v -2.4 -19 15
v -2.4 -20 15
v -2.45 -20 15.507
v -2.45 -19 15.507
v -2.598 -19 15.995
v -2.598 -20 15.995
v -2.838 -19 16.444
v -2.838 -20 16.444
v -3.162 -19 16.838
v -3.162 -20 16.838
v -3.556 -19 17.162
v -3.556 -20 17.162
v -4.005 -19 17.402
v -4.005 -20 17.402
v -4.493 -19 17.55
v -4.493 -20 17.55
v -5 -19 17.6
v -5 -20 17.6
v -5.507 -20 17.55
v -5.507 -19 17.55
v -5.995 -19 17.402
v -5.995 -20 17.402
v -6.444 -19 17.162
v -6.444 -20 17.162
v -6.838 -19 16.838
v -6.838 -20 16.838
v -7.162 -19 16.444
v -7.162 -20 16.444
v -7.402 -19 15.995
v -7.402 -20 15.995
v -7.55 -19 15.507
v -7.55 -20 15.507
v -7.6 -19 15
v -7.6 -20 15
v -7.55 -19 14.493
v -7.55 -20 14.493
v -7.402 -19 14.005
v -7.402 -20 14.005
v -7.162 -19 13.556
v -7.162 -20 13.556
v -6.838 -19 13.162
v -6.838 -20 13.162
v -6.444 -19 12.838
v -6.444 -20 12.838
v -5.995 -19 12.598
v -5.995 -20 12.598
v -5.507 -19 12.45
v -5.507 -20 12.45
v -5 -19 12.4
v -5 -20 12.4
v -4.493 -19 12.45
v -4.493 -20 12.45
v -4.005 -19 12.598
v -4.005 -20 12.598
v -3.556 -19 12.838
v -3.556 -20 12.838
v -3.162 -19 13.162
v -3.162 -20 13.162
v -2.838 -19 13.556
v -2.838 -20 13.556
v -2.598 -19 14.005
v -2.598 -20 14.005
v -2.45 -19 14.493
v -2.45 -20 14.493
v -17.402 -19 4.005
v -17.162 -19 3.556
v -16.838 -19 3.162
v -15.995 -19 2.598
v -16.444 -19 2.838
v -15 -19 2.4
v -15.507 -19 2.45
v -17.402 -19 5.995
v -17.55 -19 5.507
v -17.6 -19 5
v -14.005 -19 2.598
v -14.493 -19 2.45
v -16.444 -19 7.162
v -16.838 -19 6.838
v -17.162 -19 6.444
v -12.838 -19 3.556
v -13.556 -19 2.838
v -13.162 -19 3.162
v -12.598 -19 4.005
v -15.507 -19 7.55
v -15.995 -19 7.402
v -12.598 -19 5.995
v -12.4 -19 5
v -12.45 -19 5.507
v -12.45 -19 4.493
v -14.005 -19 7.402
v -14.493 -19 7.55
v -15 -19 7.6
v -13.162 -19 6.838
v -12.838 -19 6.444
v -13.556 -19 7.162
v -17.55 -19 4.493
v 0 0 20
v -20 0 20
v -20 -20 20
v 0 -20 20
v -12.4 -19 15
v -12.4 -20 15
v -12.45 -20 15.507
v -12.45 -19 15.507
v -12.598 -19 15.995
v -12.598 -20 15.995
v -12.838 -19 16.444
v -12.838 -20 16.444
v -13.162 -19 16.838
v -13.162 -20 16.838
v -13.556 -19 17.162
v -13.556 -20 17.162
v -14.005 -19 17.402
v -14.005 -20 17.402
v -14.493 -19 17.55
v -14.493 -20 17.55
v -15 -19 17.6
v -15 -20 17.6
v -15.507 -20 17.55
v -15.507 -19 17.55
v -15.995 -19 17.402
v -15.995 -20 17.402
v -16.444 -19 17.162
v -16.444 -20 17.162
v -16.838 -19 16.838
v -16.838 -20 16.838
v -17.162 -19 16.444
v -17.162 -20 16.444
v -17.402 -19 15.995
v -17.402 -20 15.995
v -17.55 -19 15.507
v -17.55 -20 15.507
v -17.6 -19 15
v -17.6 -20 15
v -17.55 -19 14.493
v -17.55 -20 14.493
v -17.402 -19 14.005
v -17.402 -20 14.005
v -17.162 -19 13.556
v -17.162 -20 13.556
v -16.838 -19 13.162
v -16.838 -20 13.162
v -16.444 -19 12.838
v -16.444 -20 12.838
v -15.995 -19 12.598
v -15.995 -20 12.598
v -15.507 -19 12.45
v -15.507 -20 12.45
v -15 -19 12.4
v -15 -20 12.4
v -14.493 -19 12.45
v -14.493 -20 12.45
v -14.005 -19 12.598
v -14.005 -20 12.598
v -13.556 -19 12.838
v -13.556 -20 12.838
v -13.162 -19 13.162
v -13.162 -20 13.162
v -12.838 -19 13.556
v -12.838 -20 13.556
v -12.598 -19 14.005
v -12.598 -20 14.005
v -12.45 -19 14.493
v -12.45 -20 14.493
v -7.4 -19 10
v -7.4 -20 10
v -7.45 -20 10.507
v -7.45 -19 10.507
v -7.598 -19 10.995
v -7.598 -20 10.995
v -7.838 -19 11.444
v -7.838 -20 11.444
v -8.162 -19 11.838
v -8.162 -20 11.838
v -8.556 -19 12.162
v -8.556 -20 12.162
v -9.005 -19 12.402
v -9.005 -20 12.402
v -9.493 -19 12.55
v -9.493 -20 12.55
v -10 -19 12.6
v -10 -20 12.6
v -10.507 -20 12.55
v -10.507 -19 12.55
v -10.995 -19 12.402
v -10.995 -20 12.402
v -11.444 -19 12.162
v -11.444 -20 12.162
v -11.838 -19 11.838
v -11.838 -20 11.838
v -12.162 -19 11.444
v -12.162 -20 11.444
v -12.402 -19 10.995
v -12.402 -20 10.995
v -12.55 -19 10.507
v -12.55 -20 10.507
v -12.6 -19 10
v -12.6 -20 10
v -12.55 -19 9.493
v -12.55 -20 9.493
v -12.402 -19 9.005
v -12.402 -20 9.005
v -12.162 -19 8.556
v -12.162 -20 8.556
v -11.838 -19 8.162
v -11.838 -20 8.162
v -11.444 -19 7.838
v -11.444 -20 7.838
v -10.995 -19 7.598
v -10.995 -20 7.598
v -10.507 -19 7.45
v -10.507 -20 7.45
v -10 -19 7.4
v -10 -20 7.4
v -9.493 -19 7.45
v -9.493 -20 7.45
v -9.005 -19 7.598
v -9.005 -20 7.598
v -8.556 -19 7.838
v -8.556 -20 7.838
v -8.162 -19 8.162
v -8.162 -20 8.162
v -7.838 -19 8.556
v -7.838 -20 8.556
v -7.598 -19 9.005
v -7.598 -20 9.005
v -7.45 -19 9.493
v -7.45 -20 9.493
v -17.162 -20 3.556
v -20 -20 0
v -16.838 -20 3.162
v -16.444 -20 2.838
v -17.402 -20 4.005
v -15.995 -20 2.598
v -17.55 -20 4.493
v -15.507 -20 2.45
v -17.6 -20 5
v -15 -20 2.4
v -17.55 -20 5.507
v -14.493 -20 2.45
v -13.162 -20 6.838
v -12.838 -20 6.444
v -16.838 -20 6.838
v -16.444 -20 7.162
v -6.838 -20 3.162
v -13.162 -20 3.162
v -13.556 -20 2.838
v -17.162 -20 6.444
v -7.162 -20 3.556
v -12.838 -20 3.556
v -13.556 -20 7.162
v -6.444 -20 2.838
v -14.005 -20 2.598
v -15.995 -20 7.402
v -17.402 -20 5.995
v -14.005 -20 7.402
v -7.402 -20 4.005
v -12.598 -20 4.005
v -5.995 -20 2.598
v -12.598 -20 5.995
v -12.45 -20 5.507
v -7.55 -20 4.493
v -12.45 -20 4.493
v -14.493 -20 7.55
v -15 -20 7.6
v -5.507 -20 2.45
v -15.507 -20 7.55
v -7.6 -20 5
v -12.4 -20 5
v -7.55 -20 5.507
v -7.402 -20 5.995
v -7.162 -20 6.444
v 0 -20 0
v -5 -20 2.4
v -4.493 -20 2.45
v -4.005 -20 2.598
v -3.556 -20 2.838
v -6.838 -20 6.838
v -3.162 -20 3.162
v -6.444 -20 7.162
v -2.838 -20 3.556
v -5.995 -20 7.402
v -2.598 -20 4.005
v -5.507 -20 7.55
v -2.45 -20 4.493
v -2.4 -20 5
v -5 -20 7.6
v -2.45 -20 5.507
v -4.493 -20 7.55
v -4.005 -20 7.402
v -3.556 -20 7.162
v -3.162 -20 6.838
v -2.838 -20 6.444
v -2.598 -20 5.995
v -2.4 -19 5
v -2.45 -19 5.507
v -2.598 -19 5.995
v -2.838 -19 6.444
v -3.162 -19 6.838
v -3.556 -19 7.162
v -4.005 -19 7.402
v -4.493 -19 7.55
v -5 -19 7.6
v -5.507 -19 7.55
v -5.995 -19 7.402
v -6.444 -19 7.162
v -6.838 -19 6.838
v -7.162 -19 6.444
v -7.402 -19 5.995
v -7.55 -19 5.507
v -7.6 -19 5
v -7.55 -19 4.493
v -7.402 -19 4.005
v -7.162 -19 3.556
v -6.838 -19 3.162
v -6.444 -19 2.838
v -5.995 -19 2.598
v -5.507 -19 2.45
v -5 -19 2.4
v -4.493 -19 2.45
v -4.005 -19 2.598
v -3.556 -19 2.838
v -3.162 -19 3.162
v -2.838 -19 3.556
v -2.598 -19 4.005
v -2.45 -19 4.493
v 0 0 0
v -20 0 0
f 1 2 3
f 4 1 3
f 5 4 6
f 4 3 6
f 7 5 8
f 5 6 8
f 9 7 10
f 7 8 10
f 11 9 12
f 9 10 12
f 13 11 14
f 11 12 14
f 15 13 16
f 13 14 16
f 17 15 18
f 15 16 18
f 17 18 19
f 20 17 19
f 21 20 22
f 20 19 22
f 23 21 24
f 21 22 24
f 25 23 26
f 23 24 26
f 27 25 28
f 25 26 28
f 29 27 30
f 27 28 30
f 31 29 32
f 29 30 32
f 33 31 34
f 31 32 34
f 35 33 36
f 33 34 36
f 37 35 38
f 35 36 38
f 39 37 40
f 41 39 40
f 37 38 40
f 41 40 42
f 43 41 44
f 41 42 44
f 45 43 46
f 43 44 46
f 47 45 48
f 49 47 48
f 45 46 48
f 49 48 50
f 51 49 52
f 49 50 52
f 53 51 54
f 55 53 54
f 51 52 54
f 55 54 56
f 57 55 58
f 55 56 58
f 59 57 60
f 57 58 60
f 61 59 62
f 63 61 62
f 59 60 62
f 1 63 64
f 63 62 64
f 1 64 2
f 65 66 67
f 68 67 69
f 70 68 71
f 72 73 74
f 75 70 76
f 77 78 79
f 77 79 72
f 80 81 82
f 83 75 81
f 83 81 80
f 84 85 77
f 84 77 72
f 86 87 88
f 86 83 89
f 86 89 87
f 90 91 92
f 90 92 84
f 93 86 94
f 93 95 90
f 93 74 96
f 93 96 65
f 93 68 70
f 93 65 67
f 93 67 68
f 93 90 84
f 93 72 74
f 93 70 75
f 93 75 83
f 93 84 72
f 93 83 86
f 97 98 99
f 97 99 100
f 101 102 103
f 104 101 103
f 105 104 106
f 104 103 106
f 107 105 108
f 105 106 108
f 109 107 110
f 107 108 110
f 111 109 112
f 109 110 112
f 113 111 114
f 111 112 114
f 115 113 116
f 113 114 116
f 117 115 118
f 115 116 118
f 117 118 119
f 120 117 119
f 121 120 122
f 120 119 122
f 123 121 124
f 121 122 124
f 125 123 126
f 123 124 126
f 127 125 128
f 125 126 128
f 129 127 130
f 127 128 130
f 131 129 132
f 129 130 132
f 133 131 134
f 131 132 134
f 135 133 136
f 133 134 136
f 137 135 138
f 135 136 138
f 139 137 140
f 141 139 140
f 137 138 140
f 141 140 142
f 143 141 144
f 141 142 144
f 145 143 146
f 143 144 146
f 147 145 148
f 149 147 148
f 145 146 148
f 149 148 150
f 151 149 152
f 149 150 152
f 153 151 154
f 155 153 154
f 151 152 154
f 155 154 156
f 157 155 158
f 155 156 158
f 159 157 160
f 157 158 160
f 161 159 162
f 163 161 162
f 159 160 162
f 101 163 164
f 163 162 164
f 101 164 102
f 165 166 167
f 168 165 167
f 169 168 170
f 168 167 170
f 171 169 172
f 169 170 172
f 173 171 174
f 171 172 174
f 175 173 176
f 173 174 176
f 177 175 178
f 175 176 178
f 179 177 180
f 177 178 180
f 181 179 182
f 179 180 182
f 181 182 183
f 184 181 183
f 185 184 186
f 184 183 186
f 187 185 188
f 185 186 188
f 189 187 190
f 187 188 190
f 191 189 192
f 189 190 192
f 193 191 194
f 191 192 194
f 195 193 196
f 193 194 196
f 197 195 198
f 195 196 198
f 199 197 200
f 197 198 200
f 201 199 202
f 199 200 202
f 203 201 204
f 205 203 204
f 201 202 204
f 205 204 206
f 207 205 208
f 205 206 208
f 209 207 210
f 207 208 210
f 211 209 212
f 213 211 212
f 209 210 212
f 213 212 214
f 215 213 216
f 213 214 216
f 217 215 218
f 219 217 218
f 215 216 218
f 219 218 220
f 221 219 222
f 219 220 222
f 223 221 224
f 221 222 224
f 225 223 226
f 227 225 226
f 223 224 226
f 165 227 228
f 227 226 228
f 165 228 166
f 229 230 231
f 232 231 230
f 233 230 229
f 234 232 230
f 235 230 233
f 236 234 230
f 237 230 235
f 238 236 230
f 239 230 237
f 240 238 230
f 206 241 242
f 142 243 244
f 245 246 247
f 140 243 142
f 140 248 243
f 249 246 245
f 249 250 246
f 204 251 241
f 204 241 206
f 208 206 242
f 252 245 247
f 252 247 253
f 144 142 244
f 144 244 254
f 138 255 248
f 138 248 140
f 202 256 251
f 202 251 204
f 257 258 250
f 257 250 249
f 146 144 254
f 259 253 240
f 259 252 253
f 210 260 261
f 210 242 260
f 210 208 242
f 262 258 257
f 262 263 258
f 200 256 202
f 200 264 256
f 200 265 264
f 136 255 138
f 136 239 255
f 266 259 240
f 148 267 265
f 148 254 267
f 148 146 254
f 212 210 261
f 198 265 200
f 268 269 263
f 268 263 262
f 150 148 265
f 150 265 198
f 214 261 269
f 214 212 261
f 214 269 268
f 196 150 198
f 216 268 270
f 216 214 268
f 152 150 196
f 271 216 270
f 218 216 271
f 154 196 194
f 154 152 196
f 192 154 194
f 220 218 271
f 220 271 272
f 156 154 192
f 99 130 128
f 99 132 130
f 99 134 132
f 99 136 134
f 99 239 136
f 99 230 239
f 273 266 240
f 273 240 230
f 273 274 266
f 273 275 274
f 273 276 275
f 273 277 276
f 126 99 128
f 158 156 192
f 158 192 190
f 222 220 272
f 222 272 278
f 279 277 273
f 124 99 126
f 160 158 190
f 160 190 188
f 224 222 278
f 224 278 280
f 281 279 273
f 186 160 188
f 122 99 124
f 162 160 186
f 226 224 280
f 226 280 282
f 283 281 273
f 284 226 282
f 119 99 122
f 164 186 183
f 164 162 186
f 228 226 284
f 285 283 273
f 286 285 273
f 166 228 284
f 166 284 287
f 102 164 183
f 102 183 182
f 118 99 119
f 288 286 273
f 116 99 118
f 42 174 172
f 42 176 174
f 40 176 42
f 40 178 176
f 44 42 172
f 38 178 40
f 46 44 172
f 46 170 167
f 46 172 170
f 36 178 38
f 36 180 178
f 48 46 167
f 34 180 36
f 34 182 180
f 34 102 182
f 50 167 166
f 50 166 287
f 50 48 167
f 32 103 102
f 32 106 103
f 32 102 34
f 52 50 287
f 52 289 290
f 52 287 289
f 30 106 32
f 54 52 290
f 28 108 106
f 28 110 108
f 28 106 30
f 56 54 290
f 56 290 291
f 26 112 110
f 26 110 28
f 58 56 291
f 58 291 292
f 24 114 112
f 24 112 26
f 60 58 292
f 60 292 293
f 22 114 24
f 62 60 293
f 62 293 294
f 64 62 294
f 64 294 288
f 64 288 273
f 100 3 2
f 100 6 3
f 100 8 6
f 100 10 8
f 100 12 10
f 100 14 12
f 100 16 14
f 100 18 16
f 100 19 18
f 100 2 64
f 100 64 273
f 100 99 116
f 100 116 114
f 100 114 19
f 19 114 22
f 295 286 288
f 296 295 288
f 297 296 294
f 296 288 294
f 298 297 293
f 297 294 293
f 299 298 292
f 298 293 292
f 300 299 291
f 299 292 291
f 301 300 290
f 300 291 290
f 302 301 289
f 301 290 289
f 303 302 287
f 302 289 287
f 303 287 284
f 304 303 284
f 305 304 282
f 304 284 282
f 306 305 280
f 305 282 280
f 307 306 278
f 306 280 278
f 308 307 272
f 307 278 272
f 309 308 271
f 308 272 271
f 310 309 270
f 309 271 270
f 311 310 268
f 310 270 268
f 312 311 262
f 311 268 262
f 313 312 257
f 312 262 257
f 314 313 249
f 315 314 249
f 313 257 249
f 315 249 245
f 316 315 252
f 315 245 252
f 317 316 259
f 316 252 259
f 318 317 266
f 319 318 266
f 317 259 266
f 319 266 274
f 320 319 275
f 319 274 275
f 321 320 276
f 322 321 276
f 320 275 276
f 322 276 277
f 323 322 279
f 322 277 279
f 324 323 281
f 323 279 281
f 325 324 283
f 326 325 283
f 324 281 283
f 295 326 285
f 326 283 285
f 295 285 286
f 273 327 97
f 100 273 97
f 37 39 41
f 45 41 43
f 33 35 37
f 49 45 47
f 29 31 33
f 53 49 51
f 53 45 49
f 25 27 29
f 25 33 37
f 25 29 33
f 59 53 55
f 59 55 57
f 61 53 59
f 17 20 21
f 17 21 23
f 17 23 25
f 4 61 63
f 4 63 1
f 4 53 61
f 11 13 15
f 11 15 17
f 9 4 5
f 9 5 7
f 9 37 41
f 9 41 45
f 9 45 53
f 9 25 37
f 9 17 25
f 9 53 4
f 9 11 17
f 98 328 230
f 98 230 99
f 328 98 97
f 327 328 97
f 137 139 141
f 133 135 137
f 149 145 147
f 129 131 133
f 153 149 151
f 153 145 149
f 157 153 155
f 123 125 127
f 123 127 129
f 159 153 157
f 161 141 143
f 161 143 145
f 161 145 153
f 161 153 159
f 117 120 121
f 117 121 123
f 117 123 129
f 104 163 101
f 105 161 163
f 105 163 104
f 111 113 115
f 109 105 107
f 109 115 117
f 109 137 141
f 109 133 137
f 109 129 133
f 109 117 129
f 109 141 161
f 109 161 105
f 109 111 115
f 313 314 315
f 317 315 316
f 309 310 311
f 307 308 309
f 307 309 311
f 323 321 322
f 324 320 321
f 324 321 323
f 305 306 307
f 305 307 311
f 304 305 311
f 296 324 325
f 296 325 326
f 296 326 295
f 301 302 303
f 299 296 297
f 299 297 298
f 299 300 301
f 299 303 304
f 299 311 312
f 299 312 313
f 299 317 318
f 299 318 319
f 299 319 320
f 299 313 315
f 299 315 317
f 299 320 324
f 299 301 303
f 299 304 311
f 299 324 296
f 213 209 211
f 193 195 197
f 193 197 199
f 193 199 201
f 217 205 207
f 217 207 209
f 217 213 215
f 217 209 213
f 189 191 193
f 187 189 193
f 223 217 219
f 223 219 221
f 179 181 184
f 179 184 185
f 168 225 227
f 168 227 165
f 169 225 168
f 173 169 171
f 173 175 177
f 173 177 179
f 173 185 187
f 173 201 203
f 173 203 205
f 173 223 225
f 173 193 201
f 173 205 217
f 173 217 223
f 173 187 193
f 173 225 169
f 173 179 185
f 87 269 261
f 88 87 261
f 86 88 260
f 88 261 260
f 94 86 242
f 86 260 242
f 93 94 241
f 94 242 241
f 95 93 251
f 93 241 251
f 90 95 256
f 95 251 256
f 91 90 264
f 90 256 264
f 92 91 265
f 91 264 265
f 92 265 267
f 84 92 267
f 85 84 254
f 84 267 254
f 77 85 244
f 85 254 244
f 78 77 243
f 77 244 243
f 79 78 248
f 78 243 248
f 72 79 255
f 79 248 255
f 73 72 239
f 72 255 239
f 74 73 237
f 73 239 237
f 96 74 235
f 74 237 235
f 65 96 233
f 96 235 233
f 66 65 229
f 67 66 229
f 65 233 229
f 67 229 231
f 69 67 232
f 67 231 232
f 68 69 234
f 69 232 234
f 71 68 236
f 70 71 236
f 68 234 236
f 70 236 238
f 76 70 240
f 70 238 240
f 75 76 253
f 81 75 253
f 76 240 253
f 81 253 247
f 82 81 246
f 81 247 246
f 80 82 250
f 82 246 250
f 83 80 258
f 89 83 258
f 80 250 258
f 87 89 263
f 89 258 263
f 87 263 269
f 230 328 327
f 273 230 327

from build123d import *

# Parameters (mm, degrees)
F0_W     = 20
F0_H     = 20
F1_DEPTH = 20
F2_R     = 2.6
F3_DEPTH = 1


with BuildPart() as f1:
    # F0 (on Front) → F1 (new body)
    with BuildSketch(Plane.XZ):
        with Locations((-10, 10)):
            Rectangle(F0_W, F0_H)
    extrude(amount=F1_DEPTH)

    # F2 (on face) → F3 (cut)
    with BuildSketch(Plane.XZ.offset(20)):
        with Locations((-10, 10)):
            Circle(F2_R)
        with Locations((-15, 15)):
            Circle(F2_R)
        with Locations((-5, 15)):
            Circle(F2_R)
        with Locations((-15, 5)):
            Circle(F2_R)
        with Locations((-5, 5)):
            Circle(F2_R)
    extrude(amount=-F3_DEPTH, mode=Mode.SUBTRACT)


solid = f1.part
